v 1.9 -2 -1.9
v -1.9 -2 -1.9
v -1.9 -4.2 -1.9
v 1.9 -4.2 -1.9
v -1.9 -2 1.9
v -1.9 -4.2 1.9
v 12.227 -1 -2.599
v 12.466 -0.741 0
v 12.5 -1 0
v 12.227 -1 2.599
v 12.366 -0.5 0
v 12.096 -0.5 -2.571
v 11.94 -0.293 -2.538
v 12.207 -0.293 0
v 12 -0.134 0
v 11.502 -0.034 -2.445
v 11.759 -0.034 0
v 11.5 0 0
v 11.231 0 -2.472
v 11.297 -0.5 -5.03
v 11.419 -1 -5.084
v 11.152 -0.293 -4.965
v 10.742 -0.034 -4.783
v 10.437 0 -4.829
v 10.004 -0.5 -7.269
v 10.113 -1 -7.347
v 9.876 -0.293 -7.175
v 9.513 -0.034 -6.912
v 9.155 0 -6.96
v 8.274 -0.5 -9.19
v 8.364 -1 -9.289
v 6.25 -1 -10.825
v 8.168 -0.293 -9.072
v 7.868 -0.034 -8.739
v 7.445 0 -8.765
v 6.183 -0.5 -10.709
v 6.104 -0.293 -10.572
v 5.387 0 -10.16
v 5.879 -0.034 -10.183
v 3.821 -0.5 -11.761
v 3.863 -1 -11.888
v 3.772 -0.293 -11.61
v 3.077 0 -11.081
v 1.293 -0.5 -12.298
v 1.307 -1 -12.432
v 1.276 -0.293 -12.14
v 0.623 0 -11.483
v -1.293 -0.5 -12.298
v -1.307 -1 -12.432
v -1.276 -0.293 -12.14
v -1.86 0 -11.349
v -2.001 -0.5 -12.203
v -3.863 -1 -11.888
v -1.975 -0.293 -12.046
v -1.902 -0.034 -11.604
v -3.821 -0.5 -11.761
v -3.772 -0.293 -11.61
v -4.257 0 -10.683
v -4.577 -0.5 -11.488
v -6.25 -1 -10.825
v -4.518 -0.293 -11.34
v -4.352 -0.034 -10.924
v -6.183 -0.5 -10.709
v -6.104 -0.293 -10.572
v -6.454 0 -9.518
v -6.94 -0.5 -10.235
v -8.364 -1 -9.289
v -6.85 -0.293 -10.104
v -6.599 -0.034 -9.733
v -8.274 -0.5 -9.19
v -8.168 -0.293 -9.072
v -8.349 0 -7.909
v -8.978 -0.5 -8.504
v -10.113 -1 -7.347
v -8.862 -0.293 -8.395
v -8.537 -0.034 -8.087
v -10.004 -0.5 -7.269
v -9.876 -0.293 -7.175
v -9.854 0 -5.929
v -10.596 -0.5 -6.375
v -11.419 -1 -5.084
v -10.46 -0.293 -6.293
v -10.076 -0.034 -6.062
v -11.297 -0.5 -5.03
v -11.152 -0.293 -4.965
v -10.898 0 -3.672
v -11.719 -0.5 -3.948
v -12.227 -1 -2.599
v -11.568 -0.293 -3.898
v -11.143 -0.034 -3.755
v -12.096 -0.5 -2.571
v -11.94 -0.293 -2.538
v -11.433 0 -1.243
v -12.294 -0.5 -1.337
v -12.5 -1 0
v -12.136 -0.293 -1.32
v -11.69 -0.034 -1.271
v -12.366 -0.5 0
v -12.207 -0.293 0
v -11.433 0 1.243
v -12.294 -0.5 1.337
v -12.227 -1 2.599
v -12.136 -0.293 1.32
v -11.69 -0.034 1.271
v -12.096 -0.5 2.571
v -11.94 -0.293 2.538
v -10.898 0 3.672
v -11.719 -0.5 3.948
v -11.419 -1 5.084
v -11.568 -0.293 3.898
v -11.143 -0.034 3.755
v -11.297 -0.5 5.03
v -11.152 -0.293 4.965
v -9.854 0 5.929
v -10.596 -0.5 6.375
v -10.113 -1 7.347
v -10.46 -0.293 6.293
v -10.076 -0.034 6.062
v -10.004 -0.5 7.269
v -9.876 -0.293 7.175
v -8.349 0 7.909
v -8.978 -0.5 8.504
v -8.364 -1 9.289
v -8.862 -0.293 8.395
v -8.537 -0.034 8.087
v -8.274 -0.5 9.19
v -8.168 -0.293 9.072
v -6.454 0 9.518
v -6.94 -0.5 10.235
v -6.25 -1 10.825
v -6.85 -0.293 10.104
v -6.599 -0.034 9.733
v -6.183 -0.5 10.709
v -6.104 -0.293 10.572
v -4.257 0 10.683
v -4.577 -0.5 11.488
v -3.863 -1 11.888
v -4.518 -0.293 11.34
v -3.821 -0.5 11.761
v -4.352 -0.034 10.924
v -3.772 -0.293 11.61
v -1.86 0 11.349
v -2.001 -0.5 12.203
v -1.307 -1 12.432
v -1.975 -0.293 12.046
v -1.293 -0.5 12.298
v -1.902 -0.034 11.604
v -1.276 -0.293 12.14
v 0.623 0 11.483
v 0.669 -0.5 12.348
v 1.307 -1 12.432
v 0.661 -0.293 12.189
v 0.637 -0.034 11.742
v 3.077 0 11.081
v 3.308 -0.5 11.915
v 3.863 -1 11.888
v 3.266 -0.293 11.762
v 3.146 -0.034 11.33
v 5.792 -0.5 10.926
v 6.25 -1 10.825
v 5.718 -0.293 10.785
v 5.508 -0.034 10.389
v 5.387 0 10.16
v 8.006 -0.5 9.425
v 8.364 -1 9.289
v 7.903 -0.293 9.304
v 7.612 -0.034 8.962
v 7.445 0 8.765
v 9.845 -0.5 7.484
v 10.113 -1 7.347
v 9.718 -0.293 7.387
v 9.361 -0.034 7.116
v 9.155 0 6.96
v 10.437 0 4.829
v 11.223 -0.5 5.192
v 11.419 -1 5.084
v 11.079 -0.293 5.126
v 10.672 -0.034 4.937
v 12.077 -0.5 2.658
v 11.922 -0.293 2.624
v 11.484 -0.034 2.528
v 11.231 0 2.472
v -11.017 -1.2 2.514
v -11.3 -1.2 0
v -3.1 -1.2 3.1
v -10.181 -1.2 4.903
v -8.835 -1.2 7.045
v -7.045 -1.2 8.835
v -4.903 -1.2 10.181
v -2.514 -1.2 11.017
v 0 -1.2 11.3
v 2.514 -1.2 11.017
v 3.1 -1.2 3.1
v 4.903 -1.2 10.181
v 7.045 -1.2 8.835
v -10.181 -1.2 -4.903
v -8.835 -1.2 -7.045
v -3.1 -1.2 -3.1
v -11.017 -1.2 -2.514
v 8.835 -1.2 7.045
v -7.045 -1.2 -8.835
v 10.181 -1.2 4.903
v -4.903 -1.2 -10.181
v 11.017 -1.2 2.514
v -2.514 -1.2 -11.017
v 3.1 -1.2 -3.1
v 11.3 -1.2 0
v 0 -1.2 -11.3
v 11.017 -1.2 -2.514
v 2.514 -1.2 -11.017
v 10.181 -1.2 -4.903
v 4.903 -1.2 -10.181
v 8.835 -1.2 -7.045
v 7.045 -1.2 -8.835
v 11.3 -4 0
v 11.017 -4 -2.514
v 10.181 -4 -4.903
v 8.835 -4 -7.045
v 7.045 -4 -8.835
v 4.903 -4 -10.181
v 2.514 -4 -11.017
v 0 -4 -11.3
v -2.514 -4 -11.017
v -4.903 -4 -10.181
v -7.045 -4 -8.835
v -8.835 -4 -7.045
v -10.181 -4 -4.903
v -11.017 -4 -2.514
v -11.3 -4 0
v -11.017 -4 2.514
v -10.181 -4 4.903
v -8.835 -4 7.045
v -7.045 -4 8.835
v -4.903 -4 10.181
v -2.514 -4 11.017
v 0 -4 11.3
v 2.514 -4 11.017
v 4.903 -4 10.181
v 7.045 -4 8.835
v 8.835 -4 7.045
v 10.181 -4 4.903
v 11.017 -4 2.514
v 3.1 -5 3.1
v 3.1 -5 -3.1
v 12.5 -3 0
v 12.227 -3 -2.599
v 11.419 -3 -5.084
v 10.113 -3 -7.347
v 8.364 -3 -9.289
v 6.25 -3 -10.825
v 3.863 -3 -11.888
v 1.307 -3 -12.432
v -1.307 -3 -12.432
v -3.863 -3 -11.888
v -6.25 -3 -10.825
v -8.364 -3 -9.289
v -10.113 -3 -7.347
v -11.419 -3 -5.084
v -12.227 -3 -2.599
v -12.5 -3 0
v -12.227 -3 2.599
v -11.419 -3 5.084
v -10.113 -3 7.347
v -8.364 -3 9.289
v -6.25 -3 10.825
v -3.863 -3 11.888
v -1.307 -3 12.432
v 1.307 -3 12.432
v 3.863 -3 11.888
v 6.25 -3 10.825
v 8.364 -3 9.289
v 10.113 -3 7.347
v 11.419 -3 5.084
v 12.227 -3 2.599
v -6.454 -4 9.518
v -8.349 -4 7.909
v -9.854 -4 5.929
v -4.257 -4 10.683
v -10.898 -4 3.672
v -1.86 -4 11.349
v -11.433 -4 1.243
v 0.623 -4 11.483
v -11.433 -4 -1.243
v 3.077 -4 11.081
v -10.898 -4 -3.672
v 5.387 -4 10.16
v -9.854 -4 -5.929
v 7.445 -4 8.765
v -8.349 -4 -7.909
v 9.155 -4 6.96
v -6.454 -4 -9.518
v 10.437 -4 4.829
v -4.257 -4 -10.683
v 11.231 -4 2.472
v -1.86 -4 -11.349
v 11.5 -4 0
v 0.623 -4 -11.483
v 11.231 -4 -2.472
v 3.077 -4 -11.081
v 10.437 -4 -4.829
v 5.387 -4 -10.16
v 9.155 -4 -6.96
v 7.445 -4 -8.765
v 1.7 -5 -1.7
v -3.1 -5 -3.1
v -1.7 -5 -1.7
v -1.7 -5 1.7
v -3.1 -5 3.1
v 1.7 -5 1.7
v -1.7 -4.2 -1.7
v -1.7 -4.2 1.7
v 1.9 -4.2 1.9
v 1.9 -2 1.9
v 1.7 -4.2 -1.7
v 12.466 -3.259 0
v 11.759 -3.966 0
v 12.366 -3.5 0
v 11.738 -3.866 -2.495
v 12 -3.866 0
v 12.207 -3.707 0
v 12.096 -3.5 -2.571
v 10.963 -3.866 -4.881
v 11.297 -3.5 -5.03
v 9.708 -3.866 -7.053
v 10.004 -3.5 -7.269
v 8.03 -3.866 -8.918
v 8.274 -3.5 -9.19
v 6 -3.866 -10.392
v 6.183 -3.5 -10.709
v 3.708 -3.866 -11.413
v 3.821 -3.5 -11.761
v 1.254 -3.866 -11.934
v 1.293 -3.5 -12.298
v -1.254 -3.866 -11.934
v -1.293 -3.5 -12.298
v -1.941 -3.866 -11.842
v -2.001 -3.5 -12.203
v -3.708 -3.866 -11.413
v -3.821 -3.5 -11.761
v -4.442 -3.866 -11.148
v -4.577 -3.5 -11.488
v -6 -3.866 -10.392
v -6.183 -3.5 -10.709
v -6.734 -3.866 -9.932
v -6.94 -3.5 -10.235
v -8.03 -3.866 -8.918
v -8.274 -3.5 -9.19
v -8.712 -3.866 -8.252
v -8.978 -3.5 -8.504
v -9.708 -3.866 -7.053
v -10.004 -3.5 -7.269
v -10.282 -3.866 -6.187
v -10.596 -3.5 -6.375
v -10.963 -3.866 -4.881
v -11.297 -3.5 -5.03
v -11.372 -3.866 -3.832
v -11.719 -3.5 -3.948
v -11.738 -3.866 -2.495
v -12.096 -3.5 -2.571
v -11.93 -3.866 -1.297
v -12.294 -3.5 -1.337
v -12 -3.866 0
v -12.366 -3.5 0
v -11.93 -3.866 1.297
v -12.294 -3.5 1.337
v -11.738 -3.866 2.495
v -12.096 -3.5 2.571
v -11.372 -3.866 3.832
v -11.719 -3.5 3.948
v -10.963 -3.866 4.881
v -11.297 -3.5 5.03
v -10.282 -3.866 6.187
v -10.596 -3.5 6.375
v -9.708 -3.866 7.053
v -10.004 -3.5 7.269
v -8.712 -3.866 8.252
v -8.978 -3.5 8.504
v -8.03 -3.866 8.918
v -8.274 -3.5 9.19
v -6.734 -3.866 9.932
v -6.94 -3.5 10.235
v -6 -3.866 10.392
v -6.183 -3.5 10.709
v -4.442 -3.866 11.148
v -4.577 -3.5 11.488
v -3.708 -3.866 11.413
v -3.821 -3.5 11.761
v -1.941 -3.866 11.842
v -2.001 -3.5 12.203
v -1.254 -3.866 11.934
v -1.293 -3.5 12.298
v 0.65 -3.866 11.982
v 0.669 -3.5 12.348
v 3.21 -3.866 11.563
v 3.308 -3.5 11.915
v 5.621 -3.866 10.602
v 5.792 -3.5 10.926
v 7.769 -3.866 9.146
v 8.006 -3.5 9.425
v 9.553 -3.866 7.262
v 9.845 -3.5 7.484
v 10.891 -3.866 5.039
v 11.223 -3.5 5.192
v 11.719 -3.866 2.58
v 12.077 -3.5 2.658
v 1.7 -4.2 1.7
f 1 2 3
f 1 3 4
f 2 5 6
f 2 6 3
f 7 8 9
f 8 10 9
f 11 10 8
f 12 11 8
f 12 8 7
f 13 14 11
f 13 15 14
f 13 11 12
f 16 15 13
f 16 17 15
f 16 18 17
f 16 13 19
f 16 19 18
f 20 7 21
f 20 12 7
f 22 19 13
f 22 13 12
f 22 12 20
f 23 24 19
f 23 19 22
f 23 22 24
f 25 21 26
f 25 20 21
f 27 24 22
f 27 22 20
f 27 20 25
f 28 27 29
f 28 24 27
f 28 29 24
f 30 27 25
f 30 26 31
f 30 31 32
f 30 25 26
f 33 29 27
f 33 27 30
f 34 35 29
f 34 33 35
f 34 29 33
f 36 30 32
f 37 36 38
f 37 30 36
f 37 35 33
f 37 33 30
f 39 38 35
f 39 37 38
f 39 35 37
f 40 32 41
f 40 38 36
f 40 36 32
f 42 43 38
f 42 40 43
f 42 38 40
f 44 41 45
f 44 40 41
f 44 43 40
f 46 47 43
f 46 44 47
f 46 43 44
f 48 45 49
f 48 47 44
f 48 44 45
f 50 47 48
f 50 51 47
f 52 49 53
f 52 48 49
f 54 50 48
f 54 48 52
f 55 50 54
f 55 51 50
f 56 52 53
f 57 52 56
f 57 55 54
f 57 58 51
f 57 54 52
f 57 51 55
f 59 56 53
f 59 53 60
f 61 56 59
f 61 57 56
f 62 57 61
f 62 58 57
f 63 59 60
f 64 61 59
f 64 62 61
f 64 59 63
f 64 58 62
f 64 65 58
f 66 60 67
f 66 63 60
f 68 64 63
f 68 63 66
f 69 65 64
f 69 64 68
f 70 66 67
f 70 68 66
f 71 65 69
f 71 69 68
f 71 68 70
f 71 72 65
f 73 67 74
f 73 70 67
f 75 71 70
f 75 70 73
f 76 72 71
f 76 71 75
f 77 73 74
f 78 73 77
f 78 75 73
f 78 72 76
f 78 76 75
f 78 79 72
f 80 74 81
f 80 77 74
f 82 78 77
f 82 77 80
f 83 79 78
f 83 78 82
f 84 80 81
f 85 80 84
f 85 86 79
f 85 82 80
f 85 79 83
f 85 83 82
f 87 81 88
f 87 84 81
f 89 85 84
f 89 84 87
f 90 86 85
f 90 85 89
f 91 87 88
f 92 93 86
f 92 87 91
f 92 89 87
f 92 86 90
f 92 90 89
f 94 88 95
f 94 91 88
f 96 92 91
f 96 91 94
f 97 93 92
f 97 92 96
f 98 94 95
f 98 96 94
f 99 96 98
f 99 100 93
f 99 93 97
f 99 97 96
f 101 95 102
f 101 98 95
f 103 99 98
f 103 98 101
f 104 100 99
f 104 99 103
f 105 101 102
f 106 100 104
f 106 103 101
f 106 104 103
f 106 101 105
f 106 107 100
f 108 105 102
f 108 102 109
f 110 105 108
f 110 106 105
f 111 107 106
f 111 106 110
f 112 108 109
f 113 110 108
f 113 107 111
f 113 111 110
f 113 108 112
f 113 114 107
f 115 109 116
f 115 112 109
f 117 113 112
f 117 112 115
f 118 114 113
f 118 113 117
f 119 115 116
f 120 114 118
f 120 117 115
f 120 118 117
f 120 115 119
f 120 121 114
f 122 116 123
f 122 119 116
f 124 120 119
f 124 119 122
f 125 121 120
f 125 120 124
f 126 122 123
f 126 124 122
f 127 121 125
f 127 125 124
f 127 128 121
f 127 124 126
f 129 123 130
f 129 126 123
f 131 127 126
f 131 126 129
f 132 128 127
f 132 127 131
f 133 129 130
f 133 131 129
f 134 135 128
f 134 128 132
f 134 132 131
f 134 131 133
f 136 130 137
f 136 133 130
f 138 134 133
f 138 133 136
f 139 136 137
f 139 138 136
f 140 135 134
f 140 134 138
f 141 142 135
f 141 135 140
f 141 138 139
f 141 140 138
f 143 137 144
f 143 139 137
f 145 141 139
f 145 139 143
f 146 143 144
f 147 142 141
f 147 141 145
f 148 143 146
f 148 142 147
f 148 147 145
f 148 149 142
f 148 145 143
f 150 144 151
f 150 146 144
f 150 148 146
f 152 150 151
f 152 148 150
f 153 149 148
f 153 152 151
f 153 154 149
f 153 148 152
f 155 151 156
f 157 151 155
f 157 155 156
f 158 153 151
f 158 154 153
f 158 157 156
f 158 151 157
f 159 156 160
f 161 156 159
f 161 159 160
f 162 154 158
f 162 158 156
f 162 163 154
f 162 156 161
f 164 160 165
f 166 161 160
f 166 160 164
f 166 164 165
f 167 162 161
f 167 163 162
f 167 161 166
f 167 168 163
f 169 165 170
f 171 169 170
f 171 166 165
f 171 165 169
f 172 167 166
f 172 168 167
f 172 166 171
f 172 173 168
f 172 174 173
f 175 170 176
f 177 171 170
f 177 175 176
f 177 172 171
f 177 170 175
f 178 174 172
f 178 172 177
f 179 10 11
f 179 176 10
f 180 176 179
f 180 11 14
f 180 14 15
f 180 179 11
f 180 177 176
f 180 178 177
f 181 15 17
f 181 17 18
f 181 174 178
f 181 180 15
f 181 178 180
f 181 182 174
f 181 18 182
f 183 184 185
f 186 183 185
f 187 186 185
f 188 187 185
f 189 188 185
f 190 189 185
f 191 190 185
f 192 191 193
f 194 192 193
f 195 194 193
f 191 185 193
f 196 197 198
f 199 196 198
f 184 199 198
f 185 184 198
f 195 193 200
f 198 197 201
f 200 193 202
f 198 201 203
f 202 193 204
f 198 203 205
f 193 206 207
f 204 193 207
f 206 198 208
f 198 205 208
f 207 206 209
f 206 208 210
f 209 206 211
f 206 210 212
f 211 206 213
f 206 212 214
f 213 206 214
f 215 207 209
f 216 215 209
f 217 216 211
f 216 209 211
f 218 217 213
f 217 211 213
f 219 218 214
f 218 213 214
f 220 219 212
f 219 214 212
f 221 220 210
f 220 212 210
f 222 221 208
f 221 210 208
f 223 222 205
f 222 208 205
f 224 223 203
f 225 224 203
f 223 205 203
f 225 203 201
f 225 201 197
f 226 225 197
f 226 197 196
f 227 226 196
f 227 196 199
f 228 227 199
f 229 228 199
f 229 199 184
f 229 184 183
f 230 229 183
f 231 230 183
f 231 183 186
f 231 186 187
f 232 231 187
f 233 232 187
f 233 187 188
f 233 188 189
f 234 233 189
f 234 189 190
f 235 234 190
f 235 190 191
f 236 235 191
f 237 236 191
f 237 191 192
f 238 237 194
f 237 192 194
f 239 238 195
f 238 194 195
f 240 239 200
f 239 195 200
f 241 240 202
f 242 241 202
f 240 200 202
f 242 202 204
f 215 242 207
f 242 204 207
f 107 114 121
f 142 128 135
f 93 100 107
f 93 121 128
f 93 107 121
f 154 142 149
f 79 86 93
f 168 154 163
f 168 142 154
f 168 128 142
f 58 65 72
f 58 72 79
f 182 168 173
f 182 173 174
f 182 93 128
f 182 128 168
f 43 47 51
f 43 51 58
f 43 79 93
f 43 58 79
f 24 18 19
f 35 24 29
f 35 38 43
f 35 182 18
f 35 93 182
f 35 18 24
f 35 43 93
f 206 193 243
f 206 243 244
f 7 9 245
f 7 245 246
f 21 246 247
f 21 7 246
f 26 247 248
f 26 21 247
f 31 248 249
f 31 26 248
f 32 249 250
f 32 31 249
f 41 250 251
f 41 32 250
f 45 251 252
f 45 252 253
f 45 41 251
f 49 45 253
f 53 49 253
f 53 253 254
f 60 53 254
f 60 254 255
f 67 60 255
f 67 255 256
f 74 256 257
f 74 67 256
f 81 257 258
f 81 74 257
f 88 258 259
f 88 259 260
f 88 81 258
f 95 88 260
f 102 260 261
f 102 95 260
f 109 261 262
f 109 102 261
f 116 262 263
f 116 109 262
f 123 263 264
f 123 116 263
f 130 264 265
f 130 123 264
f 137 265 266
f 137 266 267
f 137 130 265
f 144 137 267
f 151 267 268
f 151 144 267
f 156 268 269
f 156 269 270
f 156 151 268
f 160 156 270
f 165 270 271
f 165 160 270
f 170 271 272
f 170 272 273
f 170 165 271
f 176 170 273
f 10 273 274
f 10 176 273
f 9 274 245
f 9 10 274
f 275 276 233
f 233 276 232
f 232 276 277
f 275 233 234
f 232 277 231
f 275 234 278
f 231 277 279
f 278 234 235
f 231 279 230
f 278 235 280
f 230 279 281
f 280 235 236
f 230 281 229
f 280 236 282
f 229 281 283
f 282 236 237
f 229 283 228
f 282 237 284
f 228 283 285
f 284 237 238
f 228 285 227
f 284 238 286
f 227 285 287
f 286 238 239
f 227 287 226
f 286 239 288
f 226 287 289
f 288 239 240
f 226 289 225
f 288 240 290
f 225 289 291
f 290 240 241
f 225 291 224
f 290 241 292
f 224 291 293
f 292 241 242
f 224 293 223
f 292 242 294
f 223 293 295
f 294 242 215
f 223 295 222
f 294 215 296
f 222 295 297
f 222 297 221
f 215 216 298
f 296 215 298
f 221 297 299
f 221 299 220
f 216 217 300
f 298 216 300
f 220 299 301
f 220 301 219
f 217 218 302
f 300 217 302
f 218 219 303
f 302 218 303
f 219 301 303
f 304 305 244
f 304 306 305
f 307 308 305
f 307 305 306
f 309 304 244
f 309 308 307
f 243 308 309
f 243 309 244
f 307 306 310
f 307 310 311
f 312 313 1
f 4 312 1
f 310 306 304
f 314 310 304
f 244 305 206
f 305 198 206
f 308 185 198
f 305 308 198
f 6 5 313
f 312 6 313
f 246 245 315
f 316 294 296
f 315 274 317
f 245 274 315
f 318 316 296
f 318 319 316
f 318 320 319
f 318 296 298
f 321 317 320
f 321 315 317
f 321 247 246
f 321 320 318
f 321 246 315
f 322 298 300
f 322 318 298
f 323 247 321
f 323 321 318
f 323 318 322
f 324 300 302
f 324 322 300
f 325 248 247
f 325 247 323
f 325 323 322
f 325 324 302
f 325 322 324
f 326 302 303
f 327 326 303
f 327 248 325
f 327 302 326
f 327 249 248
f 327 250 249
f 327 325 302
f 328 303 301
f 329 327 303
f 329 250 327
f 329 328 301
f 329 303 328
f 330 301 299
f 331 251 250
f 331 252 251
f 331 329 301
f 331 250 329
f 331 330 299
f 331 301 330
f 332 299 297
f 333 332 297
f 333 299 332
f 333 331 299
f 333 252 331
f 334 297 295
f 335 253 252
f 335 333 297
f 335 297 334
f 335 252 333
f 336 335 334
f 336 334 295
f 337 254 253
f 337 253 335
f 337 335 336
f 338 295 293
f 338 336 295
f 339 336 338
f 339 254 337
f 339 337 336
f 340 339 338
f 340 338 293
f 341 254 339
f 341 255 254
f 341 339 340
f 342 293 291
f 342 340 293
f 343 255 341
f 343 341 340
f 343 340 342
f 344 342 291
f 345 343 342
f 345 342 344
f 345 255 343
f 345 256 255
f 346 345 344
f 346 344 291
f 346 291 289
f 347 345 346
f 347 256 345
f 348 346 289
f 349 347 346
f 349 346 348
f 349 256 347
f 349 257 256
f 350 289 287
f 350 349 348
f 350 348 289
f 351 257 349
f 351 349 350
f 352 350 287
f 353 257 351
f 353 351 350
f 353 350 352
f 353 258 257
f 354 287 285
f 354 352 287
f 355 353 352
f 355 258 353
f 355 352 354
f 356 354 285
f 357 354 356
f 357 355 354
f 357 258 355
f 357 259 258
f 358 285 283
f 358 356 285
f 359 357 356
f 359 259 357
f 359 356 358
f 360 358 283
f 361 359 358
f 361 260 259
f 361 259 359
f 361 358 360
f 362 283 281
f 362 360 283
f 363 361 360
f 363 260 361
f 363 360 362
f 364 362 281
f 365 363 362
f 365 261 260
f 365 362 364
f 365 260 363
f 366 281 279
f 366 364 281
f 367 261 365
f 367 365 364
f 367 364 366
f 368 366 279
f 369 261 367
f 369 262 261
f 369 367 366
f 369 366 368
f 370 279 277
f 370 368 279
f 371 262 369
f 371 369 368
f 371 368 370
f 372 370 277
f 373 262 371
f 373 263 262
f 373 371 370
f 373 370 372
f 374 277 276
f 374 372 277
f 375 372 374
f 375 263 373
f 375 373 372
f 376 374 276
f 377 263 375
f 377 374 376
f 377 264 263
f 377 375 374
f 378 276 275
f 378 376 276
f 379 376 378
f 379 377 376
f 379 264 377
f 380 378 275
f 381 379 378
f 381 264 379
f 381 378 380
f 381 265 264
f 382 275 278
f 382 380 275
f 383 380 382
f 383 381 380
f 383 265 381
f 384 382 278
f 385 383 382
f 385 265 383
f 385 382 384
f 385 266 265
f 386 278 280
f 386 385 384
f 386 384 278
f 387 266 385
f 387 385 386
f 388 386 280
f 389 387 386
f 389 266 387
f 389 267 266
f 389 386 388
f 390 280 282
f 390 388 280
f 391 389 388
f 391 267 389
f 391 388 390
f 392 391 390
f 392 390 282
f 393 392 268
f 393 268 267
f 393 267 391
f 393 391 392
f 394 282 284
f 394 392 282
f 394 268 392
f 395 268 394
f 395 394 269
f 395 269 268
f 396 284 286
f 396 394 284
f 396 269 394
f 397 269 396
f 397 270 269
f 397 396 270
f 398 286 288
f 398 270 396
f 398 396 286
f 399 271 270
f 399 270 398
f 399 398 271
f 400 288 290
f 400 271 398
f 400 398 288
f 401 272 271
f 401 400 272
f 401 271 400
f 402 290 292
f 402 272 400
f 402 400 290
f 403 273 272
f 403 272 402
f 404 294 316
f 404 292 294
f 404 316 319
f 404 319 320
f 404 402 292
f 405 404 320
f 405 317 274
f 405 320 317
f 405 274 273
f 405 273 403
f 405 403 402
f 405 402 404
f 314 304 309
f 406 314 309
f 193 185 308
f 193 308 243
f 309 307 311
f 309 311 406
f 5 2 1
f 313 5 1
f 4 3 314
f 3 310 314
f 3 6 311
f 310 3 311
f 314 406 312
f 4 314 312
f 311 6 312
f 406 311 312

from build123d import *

# Parameters (mm, degrees)
SKETCH_1_R      = 12.5
EXTRUDE_1_DEPTH = 1.2
SKETCH_1_3_R    = 12.5
SKETCH_1_3_R_2  = 11.3
EXTRUDE_2_DEPTH = 4
SKETCH_1_5_W    = 6.2
SKETCH_1_5_H    = 6.2
EXTRUDE_3_DEPTH = 2
EXTRUDE_START   = -2
SKETCH_1_6_W    = 6.2
SKETCH_1_6_H    = 6.2
SKETCH_1_6_W_2  = 3.8
SKETCH_1_6_H_2  = 3.8
EXTRUDE_4_DEPTH = 3
FILLET_1_R      = 1
SKETCH_2_W      = 3.8
SKETCH_2_H      = 3.8
SKETCH_2_W_2    = 3.4
SKETCH_2_H_2    = 3.4
EXTRUDE_5_DEPTH = 0.8


with BuildPart() as part:
    # Эскиз1 → Бобышка-Вытянуть1 (new body)
    with BuildSketch(Plane(origin=(0, 0, 0), x_dir=(1, 0, 0), z_dir=(0, 1, 0))):
        Circle(SKETCH_1_R)
    extrude(amount=-EXTRUDE_1_DEPTH)

    # Эскиз1<3> → Бобышка-Вытянуть2 (add)
    with BuildSketch(Plane(origin=(0, 0, 0), x_dir=(1, 0, 0), z_dir=(0, 1, 0))):
        Circle(SKETCH_1_3_R)
        Circle(SKETCH_1_3_R_2, mode=Mode.SUBTRACT)
    extrude(amount=-EXTRUDE_2_DEPTH)

    # Эскиз1<5> → Бобышка-Вытянуть3 (add)
    with BuildSketch(Plane(origin=(0, 0, 0), x_dir=(1, 0, 0), z_dir=(0, 1, 0))):
        Rectangle(SKETCH_1_5_W, SKETCH_1_5_H)
    extrude(amount=-EXTRUDE_3_DEPTH)

    # Эскиз1<6> → Бобышка-Вытянуть4 (add)
    with BuildSketch(Plane(origin=(0, 0, 0), x_dir=(1, 0, 0), z_dir=(0, 1, 0)).offset(EXTRUDE_START)):
        Rectangle(SKETCH_1_6_W, SKETCH_1_6_H)
        Rectangle(SKETCH_1_6_W_2, SKETCH_1_6_H_2, mode=Mode.SUBTRACT)
    extrude(amount=-EXTRUDE_4_DEPTH)

    # Скругление1
    fillet_1_edges = [part.edges().sort_by_distance(p)[0] for p in [
        (-12.5, 0, 0),
        (-12.5, -4, 0),
    ]]
    fillet(fillet_1_edges, radius=FILLET_1_R)

    # Эскиз2 → Бобышка-Вытянуть5 (add)
    with BuildSketch(Plane.XZ.offset(5)):
        Rectangle(SKETCH_2_W, SKETCH_2_H)
        Rectangle(SKETCH_2_W_2, SKETCH_2_H_2, mode=Mode.SUBTRACT)
    extrude(amount=-EXTRUDE_5_DEPTH)


solid = part.part
